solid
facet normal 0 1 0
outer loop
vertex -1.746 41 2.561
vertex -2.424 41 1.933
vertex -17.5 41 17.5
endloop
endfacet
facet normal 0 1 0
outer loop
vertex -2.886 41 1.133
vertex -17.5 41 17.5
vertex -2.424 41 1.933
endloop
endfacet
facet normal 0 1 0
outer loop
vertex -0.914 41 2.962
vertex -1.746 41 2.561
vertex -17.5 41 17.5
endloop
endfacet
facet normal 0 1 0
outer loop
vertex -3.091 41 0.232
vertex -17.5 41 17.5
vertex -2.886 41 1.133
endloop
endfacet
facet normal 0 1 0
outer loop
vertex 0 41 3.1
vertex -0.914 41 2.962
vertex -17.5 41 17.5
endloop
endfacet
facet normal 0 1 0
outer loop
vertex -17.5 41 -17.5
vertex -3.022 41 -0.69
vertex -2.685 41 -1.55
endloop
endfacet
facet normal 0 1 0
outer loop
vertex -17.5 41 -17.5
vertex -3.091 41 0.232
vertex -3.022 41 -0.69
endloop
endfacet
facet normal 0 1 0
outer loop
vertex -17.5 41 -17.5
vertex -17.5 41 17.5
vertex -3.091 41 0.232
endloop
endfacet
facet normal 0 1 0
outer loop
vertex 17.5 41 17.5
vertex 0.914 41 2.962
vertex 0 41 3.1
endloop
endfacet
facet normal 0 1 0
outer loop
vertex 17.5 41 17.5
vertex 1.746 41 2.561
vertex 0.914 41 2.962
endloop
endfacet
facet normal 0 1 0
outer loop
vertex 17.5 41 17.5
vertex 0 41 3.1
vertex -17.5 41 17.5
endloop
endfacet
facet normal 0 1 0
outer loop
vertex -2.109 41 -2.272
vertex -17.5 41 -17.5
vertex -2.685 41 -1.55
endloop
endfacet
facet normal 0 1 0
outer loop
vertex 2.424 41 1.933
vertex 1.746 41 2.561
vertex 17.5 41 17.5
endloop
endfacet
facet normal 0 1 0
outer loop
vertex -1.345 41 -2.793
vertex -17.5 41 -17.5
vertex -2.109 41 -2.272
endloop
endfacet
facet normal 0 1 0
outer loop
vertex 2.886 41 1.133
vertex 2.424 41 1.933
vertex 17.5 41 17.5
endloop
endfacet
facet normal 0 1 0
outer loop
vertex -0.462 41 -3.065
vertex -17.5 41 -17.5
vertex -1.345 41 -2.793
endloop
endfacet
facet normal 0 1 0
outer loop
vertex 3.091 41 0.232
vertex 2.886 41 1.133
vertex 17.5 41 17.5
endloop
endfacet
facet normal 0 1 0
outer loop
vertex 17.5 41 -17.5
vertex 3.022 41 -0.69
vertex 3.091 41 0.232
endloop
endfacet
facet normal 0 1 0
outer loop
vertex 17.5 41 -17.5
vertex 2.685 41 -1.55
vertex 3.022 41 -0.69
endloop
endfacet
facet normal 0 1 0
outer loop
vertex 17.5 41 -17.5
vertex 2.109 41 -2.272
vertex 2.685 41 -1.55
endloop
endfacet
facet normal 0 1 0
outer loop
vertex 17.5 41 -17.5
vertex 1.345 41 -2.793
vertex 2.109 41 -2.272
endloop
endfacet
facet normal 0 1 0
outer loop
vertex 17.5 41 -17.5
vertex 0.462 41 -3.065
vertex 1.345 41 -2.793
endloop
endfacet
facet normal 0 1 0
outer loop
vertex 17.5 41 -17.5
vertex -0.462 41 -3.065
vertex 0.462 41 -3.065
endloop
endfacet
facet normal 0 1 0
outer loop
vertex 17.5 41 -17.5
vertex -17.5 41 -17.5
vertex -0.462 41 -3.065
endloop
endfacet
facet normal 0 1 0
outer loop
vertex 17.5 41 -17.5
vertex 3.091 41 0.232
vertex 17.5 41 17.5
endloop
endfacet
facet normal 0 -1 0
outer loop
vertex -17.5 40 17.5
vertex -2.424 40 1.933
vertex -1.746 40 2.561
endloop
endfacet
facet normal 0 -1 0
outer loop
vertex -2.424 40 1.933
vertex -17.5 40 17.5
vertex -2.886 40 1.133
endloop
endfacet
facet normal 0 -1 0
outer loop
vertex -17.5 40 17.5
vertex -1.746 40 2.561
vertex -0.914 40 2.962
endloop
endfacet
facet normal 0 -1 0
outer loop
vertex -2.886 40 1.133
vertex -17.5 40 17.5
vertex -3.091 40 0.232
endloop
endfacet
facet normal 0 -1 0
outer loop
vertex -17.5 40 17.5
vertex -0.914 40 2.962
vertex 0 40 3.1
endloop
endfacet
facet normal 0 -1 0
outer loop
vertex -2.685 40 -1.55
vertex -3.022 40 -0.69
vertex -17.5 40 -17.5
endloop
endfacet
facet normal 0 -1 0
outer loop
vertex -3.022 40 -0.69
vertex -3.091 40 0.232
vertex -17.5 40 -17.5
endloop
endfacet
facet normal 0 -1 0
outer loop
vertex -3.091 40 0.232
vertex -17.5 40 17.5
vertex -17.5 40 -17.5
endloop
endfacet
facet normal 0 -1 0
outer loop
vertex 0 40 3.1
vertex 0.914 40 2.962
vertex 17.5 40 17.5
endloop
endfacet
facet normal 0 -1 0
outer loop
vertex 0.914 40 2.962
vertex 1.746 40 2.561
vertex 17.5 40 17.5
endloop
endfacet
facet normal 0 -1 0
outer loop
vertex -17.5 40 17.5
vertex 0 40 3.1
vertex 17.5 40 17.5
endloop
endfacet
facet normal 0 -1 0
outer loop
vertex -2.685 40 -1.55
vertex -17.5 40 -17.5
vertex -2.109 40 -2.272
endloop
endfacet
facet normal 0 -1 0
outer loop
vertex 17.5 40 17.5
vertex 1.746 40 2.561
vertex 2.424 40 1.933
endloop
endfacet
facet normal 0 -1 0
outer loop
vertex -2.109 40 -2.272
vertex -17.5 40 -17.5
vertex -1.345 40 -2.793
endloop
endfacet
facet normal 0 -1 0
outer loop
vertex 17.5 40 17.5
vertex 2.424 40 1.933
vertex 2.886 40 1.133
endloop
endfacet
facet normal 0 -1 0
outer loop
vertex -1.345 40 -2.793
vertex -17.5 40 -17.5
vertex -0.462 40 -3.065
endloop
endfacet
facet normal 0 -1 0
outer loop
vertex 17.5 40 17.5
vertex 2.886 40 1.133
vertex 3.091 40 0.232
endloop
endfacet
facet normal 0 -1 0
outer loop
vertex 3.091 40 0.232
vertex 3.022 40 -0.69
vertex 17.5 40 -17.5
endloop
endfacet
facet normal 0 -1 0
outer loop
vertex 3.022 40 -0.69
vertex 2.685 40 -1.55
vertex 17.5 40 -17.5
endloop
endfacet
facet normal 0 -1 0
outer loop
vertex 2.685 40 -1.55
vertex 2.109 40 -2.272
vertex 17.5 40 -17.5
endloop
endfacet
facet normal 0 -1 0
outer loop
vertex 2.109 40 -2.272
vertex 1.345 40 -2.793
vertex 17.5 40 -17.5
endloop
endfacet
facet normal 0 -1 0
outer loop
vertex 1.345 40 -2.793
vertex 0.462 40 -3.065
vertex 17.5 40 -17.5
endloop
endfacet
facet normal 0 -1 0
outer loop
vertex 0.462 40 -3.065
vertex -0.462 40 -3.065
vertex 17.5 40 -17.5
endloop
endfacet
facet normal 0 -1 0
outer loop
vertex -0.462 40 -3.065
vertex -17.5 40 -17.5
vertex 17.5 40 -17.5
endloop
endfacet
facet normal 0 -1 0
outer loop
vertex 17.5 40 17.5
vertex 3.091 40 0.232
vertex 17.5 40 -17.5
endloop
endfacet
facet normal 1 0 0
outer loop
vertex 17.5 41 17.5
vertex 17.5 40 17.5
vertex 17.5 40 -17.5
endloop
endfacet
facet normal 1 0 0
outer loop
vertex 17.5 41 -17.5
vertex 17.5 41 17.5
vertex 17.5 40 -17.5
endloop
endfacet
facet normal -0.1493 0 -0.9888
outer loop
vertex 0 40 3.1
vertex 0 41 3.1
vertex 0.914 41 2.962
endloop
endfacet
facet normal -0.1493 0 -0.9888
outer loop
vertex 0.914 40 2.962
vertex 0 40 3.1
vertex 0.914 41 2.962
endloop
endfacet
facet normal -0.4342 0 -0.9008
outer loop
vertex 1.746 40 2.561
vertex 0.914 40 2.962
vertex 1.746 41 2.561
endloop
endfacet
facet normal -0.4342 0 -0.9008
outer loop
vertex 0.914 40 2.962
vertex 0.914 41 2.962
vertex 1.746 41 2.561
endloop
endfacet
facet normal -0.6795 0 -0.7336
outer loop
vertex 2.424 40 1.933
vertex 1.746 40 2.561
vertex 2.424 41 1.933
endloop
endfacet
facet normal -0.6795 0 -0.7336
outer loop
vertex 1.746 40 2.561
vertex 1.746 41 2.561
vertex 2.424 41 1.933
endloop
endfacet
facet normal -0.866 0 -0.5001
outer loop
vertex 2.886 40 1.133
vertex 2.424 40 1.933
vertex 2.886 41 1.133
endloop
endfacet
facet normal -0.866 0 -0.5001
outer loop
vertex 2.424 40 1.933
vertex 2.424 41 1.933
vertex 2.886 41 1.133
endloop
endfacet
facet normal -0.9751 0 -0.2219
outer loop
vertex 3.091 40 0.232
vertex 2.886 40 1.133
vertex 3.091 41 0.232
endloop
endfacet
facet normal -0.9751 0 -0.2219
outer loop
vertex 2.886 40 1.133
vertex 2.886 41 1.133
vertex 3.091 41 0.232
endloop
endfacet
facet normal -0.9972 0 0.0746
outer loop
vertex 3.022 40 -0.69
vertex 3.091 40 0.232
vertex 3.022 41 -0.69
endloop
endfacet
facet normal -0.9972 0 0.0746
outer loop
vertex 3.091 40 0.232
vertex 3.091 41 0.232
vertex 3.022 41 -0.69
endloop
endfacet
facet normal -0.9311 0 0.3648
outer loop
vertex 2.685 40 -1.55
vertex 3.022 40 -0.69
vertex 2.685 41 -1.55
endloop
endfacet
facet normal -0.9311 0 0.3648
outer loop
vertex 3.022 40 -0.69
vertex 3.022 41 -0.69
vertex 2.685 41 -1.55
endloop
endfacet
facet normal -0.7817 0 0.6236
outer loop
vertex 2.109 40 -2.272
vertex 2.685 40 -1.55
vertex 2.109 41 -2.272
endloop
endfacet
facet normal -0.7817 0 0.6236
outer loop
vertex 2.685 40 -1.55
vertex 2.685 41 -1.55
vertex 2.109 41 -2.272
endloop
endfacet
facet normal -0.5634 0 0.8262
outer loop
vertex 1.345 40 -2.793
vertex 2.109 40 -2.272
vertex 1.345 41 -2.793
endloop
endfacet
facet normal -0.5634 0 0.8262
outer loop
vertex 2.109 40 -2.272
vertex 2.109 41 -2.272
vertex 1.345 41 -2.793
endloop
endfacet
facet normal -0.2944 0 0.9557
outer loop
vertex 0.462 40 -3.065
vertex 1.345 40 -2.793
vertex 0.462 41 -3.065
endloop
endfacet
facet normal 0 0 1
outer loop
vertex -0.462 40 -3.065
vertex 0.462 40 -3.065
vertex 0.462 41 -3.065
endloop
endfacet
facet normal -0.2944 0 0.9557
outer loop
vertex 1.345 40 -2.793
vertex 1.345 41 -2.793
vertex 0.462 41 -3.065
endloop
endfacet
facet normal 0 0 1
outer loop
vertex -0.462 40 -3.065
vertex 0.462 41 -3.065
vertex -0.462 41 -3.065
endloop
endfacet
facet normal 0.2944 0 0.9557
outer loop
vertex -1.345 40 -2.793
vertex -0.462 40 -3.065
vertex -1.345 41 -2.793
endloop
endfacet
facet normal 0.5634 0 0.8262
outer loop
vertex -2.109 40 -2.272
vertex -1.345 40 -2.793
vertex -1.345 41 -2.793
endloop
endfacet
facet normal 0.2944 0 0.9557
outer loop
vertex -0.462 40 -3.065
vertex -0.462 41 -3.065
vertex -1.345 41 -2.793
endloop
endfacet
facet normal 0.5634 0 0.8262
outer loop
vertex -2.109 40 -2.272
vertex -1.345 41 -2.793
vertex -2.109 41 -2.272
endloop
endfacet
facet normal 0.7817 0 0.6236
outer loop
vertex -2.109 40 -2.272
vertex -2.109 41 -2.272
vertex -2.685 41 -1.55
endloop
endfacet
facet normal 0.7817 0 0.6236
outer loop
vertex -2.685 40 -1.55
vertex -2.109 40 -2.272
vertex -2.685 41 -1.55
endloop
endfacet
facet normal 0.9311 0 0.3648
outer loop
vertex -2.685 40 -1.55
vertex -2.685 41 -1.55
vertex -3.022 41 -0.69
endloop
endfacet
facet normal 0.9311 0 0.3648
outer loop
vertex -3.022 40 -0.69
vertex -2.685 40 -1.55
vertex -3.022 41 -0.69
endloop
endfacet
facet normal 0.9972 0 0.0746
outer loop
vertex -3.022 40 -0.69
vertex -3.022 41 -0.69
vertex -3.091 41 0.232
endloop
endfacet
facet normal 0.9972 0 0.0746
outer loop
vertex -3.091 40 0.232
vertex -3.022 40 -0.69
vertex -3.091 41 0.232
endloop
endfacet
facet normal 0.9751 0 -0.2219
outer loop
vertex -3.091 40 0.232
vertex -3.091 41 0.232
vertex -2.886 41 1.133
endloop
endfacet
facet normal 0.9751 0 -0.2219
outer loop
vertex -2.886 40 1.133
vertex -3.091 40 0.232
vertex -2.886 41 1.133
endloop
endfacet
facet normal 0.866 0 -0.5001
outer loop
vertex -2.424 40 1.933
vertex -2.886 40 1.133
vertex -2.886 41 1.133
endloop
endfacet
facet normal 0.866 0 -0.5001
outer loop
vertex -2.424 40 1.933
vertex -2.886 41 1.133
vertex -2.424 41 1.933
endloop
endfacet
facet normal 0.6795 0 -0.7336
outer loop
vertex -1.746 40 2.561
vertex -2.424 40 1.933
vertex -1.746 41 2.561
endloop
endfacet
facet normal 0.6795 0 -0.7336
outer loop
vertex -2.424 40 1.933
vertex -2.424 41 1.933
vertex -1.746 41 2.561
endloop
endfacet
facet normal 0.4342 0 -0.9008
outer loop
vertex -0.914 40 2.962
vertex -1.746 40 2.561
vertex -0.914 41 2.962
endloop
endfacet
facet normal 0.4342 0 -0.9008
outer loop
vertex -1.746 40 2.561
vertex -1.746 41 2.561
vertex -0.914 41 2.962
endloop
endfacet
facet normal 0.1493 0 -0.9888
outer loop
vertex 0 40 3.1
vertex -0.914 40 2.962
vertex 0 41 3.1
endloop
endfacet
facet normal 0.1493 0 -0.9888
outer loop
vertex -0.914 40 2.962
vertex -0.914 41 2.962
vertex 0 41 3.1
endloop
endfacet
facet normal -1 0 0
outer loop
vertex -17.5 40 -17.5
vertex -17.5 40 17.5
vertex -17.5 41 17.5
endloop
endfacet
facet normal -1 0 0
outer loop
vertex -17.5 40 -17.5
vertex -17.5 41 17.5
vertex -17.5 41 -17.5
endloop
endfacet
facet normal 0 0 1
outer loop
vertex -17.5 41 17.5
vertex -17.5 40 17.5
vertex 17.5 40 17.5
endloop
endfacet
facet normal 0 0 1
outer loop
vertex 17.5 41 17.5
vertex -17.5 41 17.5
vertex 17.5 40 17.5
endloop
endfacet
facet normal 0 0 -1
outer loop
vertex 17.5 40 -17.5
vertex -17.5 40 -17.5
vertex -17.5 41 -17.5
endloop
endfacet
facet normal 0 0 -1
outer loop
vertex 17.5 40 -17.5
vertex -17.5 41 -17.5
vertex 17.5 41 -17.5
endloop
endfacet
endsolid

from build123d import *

# Parameters (mm, degrees)
SKETCH2_W                = 35
SKETCH2_H                = 35
BOSS_EXTRUDE1_DEPTH      = 10
SKETCH3_W                = 35
SKETCH3_H                = 35
SKETCH3_W_2              = 25
SKETCH3_H_2              = 25
BOSS_EXTRUDE2_DEPTH      = 15
SKETCH4_W                = 35
SKETCH4_H                = 35
BOSS_EXTRUDE3_DEPTH      = 15
CUT_EXTRUDE1_START       = -40
SKETCH5_R                = 3.05
CUT_EXTRUDE1_DEPTH       = 40
BOSS_EXTRUDE4_DEPTH      = 10
BOSS_EXTRUDE4_DEPTH_BACK = 40
SKETCH6_W                = 7.5
SKETCH6_H                = 1.017843133
SKETCH6_H_2              = 1.2761833
SKETCH7_R                = 2.76
CUT_EXTRUDE2_DEPTH       = 10
SKETCH8_W                = 35
SKETCH8_H                = 35
BOSS_EXTRUDE5_DEPTH      = 1
SKETCH9_R                = 3.1
CUT_EXTRUDE3_DEPTH       = 1


with BuildPart() as part:
    # Sketch2 → Boss-Extrude1 (new body)
    with BuildSketch(Plane(origin=(0, 0, 0), x_dir=(1, 0, 0), z_dir=(0, 1, 0))):
        Rectangle(SKETCH2_W, SKETCH2_H)
    extrude(amount=BOSS_EXTRUDE1_DEPTH)


with BuildPart() as body_2:
    # Sketch3 → Boss-Extrude2 (new body)
    with BuildSketch(Plane(origin=(0, 10, 0), x_dir=(1, 0, 0), z_dir=(0, 1, 0))):
        Rectangle(SKETCH3_W, SKETCH3_H)
        Rectangle(SKETCH3_W_2, SKETCH3_H_2, mode=Mode.SUBTRACT)
    extrude(amount=BOSS_EXTRUDE2_DEPTH)


with BuildPart() as body_3:
    # Sketch4 → Boss-Extrude3 (new body)
    with BuildSketch(Plane(origin=(0, 25, 0), x_dir=(1, 0, 0), z_dir=(0, 1, 0))):
        Rectangle(SKETCH4_W, SKETCH4_H)
    extrude(amount=BOSS_EXTRUDE3_DEPTH)


with BuildPart() as cut_extrude1_tool:
    # Sketch5 → Cut-Extrude1 (new body)
    with BuildSketch(Plane(origin=(0, 40, 0), x_dir=(1, 0, 0), z_dir=(0, 1, 0)).offset(CUT_EXTRUDE1_START)):
        with Locations(Location((0, 0, 0), (0, 0, 270))):
            Circle(SKETCH5_R)
    extrude(amount=CUT_EXTRUDE1_DEPTH)


with BuildPart() as part_1:
    add(part.part)

    # Cut-Extrude1: cut by cut_extrude1_tool
    add(cut_extrude1_tool.part, mode=Mode.SUBTRACT)


with BuildPart() as body_3_1:
    add(body_3.part)

    # Cut-Extrude1: cut by cut_extrude1_tool
    add(cut_extrude1_tool.part, mode=Mode.SUBTRACT)

    # Sketch6 → Boss-Extrude4 (add, two sides: drawn at the far end of the back side and taken through both)
    with BuildSketch(Plane(origin=(0, 0, -17.5), x_dir=(-1, 0, 0), z_dir=(0, 0, -1)).offset(-BOSS_EXTRUDE4_DEPTH_BACK)):
        with Locations((-13.75, 25.508921566)):
            Rectangle(SKETCH6_W, SKETCH6_H)
        with Locations((13.75, 25.63809165)):
            Rectangle(SKETCH6_W, SKETCH6_H_2)
    extrude(amount=BOSS_EXTRUDE4_DEPTH + BOSS_EXTRUDE4_DEPTH_BACK)

    # Sketch7 → Cut-Extrude2 (cut)
    with BuildSketch(Plane(origin=(0, 26.2761833, 0), x_dir=(1, 0, 0), z_dir=(0, 1, 0))):
        with Locations(Location((-13.75, 22.5, 0), (0, 0, 270))):
            Circle(SKETCH7_R)
        with Locations((8.75, 22.5)):
            Circle(SKETCH7_R)
        with Locations((8.75, -18)):
            Circle(SKETCH7_R)
        with Locations(Location((-13.75, -18, 0), (0, 0, 270))):
            Circle(SKETCH7_R)
    extrude(amount=-CUT_EXTRUDE2_DEPTH, mode=Mode.SUBTRACT)


with BuildPart() as body_2_2:
    # Sketch8 → Boss-Extrude5 (new body)
    with BuildSketch(Plane(origin=(0, 40, 0), x_dir=(1, 0, 0), z_dir=(0, 1, 0))):
        Rectangle(SKETCH8_W, SKETCH8_H)
    extrude(amount=BOSS_EXTRUDE5_DEPTH)

    # Sketch9 → Cut-Extrude3 (cut)
    with BuildSketch(Plane(origin=(0, 41, 0), x_dir=(1, 0, 0), z_dir=(0, 1, 0))):
        with Locations(Location((0, 0, 0), (0, 0, 270))):
            Circle(SKETCH9_R)
    extrude(amount=-CUT_EXTRUDE3_DEPTH, mode=Mode.SUBTRACT)


solid = body_2_2.part
